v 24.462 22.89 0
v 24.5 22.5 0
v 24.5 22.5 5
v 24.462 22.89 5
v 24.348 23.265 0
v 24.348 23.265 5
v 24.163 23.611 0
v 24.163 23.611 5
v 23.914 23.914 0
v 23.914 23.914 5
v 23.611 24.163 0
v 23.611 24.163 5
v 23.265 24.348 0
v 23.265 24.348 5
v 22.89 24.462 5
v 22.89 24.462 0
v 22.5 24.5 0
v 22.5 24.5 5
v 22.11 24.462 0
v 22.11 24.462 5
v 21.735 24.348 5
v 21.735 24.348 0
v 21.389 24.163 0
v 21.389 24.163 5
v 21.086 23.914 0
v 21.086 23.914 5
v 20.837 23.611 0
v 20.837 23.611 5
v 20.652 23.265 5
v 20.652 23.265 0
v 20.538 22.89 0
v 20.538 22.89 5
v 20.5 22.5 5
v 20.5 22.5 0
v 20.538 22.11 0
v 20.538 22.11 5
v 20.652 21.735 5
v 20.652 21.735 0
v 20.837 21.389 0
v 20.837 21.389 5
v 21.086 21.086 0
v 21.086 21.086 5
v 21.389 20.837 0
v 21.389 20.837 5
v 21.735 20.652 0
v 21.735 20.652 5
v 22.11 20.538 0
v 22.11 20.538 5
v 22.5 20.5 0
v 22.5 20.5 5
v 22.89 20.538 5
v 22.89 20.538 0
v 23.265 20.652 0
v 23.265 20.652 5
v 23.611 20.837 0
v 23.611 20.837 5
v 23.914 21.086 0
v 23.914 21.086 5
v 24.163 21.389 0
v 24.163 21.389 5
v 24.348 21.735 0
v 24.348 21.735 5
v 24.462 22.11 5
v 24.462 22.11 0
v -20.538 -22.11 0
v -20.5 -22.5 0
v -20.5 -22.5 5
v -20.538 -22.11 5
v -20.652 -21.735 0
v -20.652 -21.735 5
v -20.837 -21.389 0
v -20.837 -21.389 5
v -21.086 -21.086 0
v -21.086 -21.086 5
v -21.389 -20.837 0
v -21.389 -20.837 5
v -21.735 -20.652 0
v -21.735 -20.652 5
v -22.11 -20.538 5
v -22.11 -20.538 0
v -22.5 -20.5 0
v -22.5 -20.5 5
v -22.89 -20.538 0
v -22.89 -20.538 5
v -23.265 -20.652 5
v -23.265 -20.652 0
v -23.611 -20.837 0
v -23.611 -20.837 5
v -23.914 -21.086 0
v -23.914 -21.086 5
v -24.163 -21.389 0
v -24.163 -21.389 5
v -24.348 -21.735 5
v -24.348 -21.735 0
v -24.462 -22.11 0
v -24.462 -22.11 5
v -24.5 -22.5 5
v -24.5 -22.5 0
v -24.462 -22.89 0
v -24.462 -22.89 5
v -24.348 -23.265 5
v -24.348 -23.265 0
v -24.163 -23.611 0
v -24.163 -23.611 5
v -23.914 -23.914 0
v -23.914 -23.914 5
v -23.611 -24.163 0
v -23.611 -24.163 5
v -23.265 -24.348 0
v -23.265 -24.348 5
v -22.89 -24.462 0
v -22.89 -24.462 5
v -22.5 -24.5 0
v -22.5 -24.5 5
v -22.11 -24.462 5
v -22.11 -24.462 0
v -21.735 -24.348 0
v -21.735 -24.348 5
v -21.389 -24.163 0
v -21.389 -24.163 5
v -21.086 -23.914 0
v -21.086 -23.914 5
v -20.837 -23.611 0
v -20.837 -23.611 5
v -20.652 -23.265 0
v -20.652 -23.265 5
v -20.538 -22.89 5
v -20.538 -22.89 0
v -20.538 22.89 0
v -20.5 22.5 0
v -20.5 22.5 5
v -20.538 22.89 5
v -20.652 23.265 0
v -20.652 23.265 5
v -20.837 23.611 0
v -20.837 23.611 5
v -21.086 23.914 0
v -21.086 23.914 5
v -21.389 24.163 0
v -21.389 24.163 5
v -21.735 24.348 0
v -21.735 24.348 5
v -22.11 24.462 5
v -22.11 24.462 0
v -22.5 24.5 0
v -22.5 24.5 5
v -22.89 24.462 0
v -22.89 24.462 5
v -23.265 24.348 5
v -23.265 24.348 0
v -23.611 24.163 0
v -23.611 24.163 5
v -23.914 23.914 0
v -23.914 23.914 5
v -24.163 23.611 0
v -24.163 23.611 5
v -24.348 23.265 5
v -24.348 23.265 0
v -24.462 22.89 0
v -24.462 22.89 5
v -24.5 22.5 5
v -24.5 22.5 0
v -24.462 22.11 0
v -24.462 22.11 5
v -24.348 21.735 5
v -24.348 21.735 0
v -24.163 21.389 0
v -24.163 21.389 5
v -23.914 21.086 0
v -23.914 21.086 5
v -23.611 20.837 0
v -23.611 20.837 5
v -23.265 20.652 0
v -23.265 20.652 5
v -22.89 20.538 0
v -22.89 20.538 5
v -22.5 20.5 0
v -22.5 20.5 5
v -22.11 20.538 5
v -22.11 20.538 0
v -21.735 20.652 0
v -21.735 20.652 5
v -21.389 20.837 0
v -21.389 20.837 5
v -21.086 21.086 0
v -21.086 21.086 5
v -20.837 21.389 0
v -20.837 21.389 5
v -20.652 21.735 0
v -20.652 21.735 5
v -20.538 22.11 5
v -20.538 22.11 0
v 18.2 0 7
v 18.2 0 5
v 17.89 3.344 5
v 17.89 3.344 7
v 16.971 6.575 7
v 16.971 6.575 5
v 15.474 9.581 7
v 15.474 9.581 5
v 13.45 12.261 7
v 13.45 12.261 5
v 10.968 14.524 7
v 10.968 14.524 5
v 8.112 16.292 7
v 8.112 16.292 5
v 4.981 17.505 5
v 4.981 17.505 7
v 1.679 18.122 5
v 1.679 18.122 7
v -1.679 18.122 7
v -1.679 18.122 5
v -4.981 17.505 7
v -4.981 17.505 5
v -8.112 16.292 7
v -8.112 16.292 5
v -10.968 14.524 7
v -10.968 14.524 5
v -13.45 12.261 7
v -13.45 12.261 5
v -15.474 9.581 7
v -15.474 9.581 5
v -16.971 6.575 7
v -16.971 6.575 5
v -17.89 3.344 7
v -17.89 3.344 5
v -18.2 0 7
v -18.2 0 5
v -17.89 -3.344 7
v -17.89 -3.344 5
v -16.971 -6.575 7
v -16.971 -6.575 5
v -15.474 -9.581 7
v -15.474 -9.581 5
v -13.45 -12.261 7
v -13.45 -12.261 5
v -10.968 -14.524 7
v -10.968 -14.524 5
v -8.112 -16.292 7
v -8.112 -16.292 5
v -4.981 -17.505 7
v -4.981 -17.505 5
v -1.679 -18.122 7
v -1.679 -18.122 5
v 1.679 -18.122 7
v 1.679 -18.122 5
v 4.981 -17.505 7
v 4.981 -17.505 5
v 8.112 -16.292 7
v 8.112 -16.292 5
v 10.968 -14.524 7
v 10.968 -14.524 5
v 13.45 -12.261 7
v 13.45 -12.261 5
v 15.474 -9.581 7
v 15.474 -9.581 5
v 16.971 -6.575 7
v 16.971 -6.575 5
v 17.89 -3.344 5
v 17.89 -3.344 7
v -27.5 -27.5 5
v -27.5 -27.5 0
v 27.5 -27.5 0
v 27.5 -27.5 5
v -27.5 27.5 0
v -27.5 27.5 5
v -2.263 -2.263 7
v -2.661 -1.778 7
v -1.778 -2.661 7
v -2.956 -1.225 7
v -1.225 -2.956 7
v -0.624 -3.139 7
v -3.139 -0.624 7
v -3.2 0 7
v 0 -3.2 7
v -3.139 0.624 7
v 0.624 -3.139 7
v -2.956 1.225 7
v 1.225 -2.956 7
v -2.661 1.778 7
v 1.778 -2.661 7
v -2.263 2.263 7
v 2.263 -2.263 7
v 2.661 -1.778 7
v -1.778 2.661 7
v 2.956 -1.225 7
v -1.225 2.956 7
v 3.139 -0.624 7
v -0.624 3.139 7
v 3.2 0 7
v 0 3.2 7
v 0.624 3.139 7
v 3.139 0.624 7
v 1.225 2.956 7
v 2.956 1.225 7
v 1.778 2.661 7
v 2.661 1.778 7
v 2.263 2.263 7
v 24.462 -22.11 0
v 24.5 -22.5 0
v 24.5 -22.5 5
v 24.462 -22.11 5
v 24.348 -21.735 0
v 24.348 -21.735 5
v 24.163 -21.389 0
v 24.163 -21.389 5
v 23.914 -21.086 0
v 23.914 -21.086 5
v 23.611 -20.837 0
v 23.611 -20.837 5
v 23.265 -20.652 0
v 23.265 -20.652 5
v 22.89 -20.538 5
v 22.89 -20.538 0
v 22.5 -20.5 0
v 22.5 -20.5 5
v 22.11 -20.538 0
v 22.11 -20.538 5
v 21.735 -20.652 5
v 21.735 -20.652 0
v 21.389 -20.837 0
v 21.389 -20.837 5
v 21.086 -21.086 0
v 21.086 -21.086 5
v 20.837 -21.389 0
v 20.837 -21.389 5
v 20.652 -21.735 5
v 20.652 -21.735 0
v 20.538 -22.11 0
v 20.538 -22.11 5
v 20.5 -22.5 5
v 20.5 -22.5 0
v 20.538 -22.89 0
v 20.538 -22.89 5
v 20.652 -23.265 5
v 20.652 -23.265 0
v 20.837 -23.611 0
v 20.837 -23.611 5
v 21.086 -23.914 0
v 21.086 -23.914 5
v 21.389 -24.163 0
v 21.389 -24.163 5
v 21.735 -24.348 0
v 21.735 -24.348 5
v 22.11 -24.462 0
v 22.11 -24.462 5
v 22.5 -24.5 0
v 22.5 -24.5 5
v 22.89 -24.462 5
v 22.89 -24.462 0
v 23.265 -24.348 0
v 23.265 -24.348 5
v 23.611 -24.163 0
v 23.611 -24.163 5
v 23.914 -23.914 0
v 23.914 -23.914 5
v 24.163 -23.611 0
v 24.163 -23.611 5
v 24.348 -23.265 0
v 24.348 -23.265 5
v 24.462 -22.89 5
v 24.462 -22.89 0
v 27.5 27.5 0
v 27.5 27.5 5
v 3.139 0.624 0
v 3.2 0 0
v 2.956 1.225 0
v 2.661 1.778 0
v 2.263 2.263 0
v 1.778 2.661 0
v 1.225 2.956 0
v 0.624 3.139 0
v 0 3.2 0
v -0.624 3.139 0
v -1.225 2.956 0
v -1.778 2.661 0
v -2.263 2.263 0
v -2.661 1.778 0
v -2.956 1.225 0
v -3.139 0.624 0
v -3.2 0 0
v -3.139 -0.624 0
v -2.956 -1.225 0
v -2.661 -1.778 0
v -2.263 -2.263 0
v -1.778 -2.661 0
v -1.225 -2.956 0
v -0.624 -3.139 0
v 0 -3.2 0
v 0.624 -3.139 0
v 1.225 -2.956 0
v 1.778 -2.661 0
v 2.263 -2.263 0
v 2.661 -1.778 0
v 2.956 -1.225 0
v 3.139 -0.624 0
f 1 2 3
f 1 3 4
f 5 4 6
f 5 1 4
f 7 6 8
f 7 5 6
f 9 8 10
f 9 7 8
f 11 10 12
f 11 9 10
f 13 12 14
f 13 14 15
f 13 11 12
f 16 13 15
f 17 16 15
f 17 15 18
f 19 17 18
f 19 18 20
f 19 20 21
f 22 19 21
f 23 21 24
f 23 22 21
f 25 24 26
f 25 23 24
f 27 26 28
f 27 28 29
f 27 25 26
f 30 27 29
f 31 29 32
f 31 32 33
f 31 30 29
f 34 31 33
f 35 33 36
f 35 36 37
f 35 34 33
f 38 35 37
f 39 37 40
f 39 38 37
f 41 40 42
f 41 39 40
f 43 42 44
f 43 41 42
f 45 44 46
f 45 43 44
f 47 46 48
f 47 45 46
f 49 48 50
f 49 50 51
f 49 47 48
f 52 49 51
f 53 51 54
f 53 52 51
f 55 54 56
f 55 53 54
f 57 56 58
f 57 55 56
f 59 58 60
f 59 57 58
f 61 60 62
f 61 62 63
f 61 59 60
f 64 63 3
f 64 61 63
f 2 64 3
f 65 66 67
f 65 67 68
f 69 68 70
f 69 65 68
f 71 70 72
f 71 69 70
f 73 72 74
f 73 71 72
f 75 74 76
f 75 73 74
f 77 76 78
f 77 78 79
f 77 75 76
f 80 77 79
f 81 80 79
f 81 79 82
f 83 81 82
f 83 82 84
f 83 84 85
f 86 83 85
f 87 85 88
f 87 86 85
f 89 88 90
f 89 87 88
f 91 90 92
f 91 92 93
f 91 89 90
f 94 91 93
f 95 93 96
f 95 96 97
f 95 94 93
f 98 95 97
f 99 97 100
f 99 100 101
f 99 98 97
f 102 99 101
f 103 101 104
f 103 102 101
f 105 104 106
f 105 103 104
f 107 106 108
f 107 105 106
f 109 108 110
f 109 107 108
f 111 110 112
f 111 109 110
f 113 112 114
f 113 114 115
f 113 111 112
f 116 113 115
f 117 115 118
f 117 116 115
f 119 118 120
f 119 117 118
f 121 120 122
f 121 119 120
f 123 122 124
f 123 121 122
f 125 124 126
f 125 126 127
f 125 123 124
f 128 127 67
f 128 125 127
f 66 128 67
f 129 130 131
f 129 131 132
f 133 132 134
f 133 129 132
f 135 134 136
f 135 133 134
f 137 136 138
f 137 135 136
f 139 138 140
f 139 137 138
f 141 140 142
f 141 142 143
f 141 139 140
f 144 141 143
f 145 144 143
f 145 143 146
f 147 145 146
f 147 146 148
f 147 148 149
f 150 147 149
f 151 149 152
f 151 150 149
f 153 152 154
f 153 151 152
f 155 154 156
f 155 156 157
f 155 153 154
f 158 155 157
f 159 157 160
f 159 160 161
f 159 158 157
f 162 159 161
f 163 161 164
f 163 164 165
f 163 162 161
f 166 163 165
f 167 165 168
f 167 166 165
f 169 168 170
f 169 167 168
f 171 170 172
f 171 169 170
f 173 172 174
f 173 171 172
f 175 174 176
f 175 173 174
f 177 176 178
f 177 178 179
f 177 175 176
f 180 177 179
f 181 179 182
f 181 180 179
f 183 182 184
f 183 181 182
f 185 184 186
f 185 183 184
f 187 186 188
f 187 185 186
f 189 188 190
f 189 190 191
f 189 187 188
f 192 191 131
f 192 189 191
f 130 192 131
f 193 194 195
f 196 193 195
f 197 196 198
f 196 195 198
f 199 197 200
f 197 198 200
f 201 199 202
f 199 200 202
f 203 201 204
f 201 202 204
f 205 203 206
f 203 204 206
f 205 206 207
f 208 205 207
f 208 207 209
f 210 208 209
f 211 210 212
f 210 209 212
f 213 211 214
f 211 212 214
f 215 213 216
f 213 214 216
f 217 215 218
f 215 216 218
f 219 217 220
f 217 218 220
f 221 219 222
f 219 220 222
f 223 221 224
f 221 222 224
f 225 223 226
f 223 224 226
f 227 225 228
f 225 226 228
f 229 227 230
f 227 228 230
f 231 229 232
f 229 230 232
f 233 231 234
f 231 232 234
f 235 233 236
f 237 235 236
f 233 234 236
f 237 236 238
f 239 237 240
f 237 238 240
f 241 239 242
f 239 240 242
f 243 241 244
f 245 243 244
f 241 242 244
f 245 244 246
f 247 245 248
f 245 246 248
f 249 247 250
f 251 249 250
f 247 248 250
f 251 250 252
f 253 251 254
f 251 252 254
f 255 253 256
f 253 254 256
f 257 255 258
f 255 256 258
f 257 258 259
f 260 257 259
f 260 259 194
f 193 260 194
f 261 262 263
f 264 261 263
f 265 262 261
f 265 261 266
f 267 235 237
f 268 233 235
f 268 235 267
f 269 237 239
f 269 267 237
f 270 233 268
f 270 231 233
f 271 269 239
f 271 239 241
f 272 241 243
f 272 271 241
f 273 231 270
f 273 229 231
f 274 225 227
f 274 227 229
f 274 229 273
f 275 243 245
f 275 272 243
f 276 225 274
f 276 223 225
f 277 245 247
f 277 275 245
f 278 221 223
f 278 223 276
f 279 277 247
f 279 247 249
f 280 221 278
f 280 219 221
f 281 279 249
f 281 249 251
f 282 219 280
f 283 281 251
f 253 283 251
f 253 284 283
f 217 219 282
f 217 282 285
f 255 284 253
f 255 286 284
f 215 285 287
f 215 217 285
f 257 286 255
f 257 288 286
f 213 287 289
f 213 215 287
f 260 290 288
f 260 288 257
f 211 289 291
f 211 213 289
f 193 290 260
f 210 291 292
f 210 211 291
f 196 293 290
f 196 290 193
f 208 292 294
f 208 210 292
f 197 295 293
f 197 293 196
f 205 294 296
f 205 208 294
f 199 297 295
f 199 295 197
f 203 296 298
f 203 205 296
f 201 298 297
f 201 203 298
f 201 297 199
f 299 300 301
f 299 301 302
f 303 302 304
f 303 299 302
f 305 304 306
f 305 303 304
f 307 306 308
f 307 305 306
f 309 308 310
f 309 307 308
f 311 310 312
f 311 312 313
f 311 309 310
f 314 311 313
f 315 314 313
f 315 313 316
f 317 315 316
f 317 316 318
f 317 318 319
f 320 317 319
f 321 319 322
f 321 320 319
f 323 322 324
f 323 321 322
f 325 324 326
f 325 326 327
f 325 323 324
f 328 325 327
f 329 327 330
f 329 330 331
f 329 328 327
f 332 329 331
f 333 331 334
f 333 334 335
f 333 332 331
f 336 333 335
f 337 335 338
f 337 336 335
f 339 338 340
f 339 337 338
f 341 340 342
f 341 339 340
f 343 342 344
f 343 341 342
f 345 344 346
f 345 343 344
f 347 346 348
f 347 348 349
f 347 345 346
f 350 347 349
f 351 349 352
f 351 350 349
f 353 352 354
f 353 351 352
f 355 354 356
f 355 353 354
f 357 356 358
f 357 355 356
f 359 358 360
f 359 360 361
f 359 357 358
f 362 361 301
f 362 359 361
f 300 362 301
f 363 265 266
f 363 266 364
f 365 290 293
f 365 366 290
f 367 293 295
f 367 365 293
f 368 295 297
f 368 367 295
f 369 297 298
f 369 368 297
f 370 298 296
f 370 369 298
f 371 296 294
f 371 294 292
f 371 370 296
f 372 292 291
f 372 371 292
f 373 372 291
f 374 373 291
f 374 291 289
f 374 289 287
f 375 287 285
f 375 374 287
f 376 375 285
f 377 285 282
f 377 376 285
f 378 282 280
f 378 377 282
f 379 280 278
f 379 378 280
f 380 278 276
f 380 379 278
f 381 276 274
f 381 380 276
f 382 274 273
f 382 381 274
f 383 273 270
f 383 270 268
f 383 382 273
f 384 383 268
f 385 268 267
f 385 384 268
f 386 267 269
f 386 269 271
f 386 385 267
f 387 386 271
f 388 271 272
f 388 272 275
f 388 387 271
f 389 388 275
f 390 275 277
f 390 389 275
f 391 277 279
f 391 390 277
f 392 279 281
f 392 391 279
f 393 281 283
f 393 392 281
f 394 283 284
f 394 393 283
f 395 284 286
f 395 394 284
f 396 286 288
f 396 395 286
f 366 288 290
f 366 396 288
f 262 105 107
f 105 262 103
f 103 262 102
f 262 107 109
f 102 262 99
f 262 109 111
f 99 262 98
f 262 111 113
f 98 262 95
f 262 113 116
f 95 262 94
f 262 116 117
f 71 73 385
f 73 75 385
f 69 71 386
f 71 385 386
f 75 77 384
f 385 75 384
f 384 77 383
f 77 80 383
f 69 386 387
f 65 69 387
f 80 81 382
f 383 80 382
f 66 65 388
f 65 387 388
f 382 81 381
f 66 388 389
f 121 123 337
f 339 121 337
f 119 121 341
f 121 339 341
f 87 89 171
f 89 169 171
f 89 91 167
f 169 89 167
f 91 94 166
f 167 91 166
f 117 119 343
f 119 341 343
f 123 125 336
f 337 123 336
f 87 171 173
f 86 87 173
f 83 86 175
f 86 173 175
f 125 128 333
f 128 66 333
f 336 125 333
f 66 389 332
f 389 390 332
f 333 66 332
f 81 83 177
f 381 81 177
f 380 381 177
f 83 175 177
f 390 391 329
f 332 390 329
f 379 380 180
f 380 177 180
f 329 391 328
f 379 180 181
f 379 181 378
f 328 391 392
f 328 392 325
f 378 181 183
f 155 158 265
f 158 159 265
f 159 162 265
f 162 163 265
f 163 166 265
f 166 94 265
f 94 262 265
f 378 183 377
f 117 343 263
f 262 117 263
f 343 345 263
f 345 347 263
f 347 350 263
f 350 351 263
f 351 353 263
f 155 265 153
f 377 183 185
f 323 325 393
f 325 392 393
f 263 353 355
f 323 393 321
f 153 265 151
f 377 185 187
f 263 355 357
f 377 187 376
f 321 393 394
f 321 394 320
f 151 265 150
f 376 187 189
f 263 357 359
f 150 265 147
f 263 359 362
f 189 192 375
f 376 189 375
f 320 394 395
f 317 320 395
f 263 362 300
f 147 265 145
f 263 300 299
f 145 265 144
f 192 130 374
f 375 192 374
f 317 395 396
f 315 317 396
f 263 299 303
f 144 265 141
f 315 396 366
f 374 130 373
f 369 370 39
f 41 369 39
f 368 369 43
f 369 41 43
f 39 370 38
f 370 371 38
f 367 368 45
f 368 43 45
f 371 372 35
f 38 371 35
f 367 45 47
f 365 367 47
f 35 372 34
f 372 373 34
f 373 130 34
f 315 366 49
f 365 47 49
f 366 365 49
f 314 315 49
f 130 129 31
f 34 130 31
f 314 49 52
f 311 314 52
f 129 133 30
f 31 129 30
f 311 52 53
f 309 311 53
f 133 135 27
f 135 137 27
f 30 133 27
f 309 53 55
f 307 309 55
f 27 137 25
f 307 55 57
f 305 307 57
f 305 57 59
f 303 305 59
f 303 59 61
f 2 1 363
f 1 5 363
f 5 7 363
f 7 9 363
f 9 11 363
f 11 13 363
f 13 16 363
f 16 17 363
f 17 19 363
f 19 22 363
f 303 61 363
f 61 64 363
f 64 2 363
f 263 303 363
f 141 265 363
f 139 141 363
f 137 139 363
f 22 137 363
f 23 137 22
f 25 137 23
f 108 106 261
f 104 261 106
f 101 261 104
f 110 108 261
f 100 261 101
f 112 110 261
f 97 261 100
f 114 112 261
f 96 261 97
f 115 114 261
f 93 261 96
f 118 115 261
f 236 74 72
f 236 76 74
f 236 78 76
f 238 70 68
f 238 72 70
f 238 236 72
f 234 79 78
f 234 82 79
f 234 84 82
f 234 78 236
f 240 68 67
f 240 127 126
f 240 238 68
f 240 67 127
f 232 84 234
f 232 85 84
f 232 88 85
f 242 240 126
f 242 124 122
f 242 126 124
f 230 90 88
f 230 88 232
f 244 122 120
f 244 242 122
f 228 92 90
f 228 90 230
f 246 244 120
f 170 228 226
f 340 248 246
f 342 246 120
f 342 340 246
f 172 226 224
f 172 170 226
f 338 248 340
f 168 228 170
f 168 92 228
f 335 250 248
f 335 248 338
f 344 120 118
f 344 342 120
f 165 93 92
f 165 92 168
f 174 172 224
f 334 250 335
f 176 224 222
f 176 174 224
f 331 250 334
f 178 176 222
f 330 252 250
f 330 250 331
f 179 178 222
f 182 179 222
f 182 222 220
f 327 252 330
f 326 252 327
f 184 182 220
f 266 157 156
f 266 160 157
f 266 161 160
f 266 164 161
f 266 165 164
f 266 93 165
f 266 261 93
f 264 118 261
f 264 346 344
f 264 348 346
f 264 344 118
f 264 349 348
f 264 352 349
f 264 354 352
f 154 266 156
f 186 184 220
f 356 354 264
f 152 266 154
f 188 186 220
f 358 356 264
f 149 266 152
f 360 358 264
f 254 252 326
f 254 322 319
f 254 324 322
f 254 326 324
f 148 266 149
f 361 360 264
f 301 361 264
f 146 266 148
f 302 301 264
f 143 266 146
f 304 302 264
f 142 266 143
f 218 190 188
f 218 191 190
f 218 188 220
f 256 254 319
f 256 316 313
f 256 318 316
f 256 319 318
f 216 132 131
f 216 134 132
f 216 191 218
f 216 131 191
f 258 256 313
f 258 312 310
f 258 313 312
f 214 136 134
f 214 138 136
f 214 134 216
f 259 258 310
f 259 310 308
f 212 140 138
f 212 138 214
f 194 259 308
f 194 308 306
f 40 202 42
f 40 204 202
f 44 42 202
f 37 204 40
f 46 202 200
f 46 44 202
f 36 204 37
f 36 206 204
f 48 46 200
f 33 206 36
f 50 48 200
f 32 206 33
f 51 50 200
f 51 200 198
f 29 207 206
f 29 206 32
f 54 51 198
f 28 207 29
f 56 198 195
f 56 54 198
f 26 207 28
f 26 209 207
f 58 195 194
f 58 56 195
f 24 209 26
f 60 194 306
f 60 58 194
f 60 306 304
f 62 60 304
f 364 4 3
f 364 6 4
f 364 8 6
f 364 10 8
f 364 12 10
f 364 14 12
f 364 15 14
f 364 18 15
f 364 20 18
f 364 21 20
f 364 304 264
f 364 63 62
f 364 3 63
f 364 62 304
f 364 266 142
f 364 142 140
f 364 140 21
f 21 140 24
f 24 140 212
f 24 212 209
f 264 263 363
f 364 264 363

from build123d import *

# Parameters (mm, degrees)
SKETCH1_W           = 55
SKETCH1_H           = 55
SKETCH1_R           = 3.2
SKETCH1_R_2         = 2
BOSS_EXTRUDE1_DEPTH = 5
SKETCH2_R           = 18.2
SKETCH2_R_2         = 3.2
BOSS_EXTRUDE2_DEPTH = 2


with BuildPart() as part:
    # Sketch1 → Boss-Extrude1 (new body)
    with BuildSketch(Plane.XY):
        Rectangle(SKETCH1_W, SKETCH1_H)
        Circle(SKETCH1_R, mode=Mode.SUBTRACT)
        with Locations((-22.5, 22.5)):
            Circle(SKETCH1_R_2, mode=Mode.SUBTRACT)
        with Locations((22.5, 22.5)):
            Circle(SKETCH1_R_2, mode=Mode.SUBTRACT)
        with Locations((-22.5, -22.5)):
            Circle(SKETCH1_R_2, mode=Mode.SUBTRACT)
        with Locations((22.5, -22.5)):
            Circle(SKETCH1_R_2, mode=Mode.SUBTRACT)
    extrude(amount=BOSS_EXTRUDE1_DEPTH)

    # Sketch2 → Boss-Extrude2 (add)
    with BuildSketch(Plane.XY.offset(5)):
        Circle(SKETCH2_R)
        Circle(SKETCH2_R_2, mode=Mode.SUBTRACT)
    extrude(amount=BOSS_EXTRUDE2_DEPTH)


solid = part.part
